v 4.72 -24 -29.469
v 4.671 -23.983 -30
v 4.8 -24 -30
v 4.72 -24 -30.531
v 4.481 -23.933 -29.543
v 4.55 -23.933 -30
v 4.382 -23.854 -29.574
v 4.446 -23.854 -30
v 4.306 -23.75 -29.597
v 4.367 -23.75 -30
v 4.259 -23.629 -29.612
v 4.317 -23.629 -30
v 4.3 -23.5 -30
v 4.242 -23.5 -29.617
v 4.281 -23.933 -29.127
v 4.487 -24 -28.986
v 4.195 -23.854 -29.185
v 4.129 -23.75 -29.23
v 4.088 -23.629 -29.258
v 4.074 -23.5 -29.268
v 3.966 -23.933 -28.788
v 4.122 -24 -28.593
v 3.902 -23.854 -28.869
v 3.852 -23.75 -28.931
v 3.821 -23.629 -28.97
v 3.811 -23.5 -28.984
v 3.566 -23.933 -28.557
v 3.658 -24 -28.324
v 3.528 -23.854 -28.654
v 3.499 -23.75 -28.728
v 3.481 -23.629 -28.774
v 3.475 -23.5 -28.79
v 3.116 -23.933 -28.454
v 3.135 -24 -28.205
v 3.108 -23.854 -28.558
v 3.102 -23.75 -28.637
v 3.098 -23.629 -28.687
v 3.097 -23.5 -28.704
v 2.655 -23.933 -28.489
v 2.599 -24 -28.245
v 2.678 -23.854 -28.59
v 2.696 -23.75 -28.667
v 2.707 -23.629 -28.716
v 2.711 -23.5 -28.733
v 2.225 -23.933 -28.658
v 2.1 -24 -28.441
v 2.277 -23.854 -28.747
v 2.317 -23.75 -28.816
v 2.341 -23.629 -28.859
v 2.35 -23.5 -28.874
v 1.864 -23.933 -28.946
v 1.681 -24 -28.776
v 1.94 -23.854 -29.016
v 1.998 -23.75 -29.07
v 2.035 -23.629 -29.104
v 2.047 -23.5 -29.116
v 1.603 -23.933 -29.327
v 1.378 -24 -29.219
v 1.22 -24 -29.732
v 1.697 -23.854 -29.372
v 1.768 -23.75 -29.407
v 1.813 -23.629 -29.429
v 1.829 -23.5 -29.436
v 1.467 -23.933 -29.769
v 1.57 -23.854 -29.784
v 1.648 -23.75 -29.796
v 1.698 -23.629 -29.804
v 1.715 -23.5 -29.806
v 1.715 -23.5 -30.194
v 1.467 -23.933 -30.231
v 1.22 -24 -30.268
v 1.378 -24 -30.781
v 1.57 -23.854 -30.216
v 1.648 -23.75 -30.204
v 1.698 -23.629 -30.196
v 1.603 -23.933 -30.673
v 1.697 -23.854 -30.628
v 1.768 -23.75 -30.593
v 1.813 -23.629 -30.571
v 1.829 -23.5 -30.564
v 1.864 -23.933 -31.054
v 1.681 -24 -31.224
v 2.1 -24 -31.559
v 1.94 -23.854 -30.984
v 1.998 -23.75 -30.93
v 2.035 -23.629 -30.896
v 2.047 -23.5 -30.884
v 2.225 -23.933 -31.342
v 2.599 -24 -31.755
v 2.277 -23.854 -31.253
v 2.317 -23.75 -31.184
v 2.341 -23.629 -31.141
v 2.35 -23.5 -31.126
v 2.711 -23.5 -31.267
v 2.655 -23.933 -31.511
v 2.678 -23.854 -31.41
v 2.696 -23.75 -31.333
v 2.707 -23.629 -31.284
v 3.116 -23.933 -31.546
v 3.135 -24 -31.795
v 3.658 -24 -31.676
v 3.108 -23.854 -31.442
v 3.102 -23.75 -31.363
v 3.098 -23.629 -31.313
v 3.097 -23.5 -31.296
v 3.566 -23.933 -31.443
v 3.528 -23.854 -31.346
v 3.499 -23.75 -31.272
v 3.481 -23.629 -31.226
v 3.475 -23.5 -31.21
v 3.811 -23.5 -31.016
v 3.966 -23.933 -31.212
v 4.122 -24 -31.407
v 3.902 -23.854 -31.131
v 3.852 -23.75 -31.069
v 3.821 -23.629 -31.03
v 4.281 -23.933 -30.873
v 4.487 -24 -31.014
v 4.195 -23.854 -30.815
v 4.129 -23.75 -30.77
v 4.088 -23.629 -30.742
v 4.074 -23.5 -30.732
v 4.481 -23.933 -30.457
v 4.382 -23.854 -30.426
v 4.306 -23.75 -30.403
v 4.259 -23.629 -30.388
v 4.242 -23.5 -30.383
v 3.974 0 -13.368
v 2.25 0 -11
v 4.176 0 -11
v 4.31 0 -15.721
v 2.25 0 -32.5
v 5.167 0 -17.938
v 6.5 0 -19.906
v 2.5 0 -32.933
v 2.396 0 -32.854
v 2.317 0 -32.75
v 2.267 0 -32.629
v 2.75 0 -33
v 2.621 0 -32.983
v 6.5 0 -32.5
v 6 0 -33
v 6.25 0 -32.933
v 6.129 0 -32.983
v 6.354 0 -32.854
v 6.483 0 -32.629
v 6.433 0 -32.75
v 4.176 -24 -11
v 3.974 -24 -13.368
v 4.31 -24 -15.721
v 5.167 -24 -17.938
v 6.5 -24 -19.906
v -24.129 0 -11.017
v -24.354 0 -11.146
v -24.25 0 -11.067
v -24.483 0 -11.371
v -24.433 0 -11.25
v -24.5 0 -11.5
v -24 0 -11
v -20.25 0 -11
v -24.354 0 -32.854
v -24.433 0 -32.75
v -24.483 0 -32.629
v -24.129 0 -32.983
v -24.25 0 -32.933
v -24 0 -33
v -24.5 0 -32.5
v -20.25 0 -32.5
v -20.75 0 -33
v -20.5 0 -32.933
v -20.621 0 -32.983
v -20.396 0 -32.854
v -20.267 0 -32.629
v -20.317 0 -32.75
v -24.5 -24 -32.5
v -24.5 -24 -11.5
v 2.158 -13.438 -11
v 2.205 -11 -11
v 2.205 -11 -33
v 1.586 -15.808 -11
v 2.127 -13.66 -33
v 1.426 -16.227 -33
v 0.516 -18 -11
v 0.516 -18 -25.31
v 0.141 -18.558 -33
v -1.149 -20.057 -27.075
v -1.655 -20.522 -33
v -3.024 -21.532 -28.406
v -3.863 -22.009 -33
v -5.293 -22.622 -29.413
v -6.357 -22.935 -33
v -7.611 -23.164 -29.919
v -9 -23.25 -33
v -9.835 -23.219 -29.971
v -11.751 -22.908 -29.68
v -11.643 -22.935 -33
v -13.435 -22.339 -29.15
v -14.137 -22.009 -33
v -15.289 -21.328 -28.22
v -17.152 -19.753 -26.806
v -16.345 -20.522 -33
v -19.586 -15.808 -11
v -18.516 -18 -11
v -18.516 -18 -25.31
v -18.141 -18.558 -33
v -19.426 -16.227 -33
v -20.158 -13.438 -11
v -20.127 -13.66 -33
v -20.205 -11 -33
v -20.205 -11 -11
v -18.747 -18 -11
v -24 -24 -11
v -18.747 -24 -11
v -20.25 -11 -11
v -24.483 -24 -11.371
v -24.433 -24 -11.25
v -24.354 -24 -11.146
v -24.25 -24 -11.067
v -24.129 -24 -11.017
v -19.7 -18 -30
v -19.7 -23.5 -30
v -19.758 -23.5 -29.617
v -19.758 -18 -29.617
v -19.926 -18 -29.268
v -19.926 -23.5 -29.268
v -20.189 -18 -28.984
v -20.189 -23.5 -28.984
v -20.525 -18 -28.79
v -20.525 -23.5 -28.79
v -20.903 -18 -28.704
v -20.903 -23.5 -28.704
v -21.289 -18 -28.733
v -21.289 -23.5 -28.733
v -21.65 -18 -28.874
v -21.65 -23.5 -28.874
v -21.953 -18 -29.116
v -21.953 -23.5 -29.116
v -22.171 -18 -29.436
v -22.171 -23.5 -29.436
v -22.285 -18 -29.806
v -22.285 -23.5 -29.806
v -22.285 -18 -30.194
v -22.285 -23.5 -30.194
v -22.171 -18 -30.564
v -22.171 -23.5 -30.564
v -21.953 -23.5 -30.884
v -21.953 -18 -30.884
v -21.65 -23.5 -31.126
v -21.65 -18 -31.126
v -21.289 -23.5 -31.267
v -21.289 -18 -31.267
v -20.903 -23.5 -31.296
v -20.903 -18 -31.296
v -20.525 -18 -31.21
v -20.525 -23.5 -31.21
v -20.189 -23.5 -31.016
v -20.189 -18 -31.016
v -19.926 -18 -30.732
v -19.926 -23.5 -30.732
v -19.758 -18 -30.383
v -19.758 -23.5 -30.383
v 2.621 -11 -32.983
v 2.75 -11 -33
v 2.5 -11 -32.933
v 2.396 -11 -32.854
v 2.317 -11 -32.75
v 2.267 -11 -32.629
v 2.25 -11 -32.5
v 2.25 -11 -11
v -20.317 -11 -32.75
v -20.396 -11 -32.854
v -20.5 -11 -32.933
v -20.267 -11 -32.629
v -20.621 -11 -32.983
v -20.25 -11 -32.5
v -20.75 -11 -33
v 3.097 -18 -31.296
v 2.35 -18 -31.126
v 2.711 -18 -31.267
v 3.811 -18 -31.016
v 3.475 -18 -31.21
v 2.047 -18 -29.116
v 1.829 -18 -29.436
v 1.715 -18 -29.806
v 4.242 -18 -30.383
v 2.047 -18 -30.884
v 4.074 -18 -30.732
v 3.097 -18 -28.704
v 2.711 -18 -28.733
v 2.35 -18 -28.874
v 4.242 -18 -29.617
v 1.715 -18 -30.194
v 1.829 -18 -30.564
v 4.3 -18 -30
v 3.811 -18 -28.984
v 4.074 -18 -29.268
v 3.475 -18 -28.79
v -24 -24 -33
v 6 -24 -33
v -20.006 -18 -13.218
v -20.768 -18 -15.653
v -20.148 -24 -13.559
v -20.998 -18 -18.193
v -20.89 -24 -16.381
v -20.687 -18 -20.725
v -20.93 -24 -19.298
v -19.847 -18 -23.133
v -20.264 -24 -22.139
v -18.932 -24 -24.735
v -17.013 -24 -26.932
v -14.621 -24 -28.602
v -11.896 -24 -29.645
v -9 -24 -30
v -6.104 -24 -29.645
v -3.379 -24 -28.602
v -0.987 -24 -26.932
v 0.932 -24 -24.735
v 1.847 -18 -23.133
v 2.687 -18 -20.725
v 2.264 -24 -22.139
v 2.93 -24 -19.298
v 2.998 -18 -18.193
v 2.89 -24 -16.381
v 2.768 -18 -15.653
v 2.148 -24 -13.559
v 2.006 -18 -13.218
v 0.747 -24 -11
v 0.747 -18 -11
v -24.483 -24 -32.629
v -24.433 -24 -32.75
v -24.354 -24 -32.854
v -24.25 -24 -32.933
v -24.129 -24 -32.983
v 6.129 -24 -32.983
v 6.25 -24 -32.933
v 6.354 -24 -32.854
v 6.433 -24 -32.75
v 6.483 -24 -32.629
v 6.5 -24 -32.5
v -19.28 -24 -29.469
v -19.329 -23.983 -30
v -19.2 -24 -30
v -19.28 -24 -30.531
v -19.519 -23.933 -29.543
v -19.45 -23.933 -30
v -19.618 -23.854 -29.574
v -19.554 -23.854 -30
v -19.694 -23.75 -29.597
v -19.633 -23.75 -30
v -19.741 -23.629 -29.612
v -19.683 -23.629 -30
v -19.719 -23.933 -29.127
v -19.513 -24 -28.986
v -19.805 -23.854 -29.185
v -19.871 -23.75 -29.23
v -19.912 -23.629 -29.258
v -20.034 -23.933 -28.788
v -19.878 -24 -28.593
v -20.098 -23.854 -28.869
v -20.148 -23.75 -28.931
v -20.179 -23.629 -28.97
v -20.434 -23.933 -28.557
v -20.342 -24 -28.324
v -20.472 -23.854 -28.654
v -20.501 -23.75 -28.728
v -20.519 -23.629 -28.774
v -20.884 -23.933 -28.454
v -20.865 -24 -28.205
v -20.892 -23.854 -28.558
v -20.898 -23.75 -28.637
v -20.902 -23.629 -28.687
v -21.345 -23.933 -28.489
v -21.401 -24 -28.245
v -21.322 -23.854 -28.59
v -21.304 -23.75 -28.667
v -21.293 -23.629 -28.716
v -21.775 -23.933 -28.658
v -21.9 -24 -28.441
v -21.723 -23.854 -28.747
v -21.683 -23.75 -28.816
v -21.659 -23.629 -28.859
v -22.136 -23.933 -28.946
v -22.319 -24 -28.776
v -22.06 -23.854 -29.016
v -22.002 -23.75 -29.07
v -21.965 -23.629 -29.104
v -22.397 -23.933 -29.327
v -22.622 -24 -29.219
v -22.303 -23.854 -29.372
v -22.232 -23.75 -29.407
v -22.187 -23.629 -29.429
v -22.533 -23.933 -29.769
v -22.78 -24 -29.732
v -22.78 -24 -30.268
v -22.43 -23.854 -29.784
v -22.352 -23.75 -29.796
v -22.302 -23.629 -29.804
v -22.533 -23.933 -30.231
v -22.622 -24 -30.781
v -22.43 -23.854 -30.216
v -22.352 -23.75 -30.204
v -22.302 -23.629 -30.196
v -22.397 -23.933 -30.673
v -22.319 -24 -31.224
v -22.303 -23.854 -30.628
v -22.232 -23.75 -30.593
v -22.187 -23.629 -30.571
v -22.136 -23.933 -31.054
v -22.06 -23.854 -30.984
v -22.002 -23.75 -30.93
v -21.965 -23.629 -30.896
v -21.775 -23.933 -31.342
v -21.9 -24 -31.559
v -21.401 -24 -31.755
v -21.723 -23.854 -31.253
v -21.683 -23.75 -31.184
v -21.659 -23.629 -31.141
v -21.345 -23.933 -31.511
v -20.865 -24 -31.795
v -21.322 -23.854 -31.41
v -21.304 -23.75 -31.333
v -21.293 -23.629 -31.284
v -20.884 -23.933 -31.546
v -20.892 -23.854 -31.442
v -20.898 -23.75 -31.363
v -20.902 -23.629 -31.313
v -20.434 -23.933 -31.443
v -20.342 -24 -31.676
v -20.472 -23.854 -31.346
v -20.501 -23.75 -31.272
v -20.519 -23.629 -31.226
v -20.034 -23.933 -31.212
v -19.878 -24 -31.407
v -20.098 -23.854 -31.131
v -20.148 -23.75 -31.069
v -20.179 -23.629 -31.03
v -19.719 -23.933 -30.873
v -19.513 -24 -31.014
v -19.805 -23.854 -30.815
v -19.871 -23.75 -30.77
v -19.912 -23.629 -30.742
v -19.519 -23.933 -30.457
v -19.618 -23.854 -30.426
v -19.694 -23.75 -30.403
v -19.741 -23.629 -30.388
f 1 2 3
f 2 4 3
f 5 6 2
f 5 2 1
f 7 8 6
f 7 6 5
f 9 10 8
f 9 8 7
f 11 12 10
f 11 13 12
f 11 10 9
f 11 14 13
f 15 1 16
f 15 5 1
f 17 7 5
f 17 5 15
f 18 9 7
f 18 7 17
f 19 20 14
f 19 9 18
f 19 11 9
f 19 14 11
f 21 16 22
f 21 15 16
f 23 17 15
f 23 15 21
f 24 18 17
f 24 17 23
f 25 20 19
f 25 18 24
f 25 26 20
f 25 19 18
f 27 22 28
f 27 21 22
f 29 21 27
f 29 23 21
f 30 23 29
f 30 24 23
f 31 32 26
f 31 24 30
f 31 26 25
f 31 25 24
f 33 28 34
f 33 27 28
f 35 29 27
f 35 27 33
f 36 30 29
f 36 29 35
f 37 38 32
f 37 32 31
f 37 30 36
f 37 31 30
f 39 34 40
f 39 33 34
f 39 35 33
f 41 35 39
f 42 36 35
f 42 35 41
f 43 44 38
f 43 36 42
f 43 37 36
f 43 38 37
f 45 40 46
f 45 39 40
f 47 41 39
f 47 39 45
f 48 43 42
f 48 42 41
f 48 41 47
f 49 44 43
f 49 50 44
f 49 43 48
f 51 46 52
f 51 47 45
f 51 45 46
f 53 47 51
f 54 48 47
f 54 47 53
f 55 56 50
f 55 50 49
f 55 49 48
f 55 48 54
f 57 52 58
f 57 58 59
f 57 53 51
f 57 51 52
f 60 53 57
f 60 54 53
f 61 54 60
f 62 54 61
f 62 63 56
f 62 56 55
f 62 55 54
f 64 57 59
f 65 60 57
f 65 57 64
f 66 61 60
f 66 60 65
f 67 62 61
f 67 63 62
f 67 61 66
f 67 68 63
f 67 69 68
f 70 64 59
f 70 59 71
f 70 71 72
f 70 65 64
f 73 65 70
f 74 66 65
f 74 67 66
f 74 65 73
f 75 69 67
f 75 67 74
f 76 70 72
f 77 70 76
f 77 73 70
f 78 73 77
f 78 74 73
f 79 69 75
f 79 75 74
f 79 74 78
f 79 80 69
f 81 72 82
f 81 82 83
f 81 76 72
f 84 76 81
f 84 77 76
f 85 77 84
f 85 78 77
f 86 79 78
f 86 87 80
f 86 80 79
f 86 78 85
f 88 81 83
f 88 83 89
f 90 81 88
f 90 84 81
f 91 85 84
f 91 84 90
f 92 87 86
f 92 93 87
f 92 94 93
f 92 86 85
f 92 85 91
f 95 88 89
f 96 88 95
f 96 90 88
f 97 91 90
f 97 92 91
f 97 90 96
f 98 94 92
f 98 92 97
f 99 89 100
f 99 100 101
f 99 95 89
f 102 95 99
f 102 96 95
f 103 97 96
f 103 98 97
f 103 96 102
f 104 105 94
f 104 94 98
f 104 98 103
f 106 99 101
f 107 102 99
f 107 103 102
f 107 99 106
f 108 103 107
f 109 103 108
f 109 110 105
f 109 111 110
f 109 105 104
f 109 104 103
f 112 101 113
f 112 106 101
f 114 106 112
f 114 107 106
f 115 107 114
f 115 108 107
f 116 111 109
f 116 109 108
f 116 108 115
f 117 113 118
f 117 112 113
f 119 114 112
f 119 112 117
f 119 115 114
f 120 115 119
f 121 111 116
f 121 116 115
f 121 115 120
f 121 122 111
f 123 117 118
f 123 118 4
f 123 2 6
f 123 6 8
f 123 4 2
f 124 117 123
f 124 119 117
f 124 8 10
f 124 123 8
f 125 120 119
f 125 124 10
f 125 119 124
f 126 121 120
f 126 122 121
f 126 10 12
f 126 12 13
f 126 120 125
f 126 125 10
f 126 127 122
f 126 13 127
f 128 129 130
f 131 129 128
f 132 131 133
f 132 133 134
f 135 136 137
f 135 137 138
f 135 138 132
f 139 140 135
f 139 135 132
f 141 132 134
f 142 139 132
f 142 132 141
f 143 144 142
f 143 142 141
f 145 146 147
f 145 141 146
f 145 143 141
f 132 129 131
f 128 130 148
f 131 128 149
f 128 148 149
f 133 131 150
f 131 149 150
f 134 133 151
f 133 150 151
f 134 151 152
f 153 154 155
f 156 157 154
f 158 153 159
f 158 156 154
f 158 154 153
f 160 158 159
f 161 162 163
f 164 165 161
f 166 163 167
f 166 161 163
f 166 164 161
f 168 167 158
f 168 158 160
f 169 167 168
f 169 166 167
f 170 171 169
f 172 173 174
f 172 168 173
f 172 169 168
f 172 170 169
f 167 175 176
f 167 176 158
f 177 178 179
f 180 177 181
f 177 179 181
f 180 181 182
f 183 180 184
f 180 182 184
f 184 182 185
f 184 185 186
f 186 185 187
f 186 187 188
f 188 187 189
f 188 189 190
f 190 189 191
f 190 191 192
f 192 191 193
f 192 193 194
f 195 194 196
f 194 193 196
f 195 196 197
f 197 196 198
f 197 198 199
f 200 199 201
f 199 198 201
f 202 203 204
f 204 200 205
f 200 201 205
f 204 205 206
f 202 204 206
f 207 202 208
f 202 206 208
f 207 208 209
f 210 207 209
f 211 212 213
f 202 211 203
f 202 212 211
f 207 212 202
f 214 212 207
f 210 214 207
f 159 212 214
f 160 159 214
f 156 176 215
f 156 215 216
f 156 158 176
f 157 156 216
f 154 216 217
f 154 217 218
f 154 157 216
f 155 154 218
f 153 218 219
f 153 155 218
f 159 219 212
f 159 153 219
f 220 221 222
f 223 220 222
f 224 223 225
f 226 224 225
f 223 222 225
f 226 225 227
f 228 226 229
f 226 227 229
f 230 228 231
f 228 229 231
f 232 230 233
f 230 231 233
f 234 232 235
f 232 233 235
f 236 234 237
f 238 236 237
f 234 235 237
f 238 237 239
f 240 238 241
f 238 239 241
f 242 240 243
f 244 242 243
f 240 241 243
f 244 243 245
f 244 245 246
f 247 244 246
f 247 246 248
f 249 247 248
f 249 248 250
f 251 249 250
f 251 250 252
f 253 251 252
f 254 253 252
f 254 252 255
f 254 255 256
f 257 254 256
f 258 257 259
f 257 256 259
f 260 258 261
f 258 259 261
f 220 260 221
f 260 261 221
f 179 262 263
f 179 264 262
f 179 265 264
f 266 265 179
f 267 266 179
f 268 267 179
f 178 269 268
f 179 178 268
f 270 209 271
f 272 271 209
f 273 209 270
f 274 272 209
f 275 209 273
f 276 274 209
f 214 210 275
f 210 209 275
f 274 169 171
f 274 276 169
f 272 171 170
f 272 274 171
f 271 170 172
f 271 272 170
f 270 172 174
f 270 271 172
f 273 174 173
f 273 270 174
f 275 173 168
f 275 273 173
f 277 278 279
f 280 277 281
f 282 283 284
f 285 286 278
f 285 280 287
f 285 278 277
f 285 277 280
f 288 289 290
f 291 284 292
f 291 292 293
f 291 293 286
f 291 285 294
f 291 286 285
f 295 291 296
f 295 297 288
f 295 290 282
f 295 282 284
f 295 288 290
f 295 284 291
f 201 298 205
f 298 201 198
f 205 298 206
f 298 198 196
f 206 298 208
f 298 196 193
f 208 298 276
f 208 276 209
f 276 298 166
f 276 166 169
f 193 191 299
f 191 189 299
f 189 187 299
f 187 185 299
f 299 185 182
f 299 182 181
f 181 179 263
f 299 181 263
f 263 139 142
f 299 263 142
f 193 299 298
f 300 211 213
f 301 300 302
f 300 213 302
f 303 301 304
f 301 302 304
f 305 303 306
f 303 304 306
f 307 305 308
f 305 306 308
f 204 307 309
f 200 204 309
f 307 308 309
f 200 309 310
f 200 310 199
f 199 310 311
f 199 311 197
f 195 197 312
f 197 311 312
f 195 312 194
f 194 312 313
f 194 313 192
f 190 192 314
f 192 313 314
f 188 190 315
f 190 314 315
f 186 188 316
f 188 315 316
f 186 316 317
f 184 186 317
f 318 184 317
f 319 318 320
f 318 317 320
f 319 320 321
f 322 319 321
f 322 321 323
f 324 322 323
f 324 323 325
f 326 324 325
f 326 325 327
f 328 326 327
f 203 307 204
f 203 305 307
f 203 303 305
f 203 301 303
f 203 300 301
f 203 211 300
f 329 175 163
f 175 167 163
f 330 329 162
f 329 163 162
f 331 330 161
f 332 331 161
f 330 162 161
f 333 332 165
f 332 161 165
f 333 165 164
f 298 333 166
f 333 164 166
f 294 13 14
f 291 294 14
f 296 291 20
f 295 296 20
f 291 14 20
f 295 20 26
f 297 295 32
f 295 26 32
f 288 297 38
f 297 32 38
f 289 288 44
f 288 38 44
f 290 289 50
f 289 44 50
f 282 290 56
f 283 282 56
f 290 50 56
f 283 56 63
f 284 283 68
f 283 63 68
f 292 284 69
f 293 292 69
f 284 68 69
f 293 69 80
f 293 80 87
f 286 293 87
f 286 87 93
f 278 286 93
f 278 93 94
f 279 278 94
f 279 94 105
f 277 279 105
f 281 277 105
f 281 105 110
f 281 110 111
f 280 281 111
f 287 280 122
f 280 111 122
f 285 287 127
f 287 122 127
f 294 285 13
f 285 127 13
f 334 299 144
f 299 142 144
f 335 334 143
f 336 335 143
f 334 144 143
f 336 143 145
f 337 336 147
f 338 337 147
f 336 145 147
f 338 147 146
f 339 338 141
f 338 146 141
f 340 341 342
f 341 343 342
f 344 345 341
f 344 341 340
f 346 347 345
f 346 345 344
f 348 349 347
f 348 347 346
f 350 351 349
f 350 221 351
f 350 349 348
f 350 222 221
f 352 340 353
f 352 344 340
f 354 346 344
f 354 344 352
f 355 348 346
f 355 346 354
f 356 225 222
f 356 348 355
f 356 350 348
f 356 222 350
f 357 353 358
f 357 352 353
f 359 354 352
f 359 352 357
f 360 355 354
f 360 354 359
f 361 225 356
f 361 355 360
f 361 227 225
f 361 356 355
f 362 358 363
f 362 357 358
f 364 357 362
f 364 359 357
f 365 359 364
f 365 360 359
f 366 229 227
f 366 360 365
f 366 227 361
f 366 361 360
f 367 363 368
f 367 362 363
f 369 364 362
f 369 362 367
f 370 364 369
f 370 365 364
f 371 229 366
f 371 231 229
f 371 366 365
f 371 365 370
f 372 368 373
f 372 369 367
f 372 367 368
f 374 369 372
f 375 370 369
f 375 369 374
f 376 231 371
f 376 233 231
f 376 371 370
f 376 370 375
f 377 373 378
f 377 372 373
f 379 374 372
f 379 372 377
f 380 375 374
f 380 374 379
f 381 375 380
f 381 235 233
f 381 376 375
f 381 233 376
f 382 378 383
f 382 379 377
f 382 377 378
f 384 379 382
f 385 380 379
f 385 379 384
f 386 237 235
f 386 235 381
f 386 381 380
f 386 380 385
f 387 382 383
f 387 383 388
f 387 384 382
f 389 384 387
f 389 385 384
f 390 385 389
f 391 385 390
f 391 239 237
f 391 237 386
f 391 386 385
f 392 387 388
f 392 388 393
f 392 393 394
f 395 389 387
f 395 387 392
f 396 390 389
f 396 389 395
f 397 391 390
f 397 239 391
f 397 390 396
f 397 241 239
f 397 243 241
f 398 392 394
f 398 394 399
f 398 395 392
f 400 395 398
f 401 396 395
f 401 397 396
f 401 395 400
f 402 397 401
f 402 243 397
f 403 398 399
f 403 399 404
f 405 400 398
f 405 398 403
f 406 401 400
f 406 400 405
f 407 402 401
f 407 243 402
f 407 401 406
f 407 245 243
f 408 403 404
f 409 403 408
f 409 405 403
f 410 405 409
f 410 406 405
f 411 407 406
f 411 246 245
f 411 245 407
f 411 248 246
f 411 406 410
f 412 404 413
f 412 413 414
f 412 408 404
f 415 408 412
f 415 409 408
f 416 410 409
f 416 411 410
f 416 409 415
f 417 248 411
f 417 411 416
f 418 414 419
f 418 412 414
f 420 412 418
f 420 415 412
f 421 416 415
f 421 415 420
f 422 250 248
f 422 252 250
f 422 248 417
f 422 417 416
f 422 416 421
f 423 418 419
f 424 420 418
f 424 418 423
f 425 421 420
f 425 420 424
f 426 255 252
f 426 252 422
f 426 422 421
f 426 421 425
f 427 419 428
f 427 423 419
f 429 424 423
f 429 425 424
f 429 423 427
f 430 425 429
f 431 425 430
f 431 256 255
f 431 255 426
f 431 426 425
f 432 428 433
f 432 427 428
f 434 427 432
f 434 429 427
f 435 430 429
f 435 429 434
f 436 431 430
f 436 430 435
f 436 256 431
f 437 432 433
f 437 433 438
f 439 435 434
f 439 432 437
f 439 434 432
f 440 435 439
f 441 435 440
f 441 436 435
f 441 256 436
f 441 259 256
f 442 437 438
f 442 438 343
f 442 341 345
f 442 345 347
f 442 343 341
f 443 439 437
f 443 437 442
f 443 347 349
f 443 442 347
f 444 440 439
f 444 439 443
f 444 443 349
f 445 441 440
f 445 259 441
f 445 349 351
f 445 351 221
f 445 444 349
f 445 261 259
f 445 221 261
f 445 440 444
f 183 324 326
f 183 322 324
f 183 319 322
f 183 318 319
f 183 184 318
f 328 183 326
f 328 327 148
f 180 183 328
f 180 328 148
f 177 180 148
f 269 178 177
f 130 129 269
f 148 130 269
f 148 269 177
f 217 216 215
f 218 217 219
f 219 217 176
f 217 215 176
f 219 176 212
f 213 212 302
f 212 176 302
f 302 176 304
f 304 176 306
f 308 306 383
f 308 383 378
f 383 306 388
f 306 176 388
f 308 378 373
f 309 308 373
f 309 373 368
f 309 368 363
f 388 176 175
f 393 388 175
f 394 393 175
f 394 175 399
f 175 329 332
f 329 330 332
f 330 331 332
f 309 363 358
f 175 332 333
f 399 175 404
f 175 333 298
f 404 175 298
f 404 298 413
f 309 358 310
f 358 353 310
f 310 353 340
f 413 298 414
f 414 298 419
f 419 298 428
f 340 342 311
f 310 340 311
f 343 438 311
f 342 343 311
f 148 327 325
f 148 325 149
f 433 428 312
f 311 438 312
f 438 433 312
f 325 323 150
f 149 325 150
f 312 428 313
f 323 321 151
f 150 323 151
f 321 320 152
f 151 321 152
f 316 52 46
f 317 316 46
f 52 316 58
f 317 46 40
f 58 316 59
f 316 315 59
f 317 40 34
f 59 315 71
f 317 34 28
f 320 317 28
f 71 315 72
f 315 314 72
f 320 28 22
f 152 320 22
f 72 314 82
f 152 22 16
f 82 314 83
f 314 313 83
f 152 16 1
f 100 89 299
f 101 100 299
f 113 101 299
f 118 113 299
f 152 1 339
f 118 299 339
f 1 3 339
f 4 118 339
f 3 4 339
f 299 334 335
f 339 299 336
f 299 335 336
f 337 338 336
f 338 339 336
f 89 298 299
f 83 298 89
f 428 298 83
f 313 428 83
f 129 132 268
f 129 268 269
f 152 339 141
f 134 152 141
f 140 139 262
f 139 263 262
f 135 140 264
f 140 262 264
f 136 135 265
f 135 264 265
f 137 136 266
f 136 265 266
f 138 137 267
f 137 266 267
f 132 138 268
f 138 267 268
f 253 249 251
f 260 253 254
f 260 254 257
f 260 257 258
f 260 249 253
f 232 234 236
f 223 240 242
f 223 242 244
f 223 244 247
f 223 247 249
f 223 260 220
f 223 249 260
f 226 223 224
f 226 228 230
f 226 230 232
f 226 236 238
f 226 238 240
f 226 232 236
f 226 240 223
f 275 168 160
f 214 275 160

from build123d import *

# Parameters (mm, degrees)
SKETCH_W        = 31
SKETCH_H        = 24
PAD_DEPTH       = 22
SKETCH001_R     = 12
SKETCH001_R_2   = 1.3
POCKET_DEPTH    = 6
SKETCH002_R     = 11.25
POCKET001_DEPTH = 22.001
SKETCH003_W     = 22.5
SKETCH003_H     = 22
POCKET002_DEPTH = 11
SKETCH004_R     = 10.5
POCKET003_DEPTH = 24.001
FILLET017_R     = 0.5


with BuildPart() as part:
    # Sketch → Pad (new body)
    with BuildSketch(Plane.XY):
        Rectangle(SKETCH_W, SKETCH_H)
    extrude(amount=PAD_DEPTH)

    # Sketch001 (on Face3 of Pad) → Pocket (cut)
    with BuildSketch(Plane.XZ.offset(12)):
        with Locations((0, 15)):
            Circle(SKETCH001_R)
        with Locations((-12, 3)):
            Circle(SKETCH001_R_2)
        with Locations((12, 3)):
            Circle(SKETCH001_R_2)
        with Locations((12, 27)):
            Circle(SKETCH001_R_2)
        with Locations((-12, 27)):
            Circle(SKETCH001_R_2)
    extrude(amount=-POCKET_DEPTH, mode=Mode.SUBTRACT)

    # Sketch002 (on Face4 of Pocket) → Pocket001 (cut, through all)
    with BuildSketch(Plane(origin=(0, 0, 0), x_dir=(1, 0, 0), z_dir=(0, 0, -1))):
        Circle(SKETCH002_R)
    extrude(amount=-POCKET001_DEPTH, mode=Mode.SUBTRACT)

    # Sketch003 (on Face1 of Pocket001) → Pocket002 (cut)
    with BuildSketch(Plane(origin=(0, 12, 0), x_dir=(-1, 0, 0), z_dir=(0, 1, 0))):
        with Locations((0, 11)):
            Rectangle(SKETCH003_W, SKETCH003_H)
    extrude(amount=-POCKET002_DEPTH, mode=Mode.SUBTRACT)

    # Sketch004 (on Face6 of Pocket002) → Pocket003 (cut, through all)
    with BuildSketch(Plane.XZ.offset(12)):
        with Locations((23.47, 19.93)):
            Circle(SKETCH004_R)
    extrude(amount=-POCKET003_DEPTH, mode=Mode.SUBTRACT)

    # Fillet017
    fillet017_edges = [part.edges().sort_by_distance(p)[0] for p in [
        (-13.3, -12, 3),
        (10.7, -12, 3),
        (-15.5, 0, 0),
        (-15.5, 0, 22),
        (15.5, 0, 0),
        (11.25, 6.5, 0),
        (-11.25, 6.5, 0),
    ]]
    fillet(fillet017_edges, radius=FILLET017_R)


with BuildPart() as part_1:
    # Body placement: moved
    add(part.part.moved(Location((-9, -12, -33))))


solid = part_1.part
